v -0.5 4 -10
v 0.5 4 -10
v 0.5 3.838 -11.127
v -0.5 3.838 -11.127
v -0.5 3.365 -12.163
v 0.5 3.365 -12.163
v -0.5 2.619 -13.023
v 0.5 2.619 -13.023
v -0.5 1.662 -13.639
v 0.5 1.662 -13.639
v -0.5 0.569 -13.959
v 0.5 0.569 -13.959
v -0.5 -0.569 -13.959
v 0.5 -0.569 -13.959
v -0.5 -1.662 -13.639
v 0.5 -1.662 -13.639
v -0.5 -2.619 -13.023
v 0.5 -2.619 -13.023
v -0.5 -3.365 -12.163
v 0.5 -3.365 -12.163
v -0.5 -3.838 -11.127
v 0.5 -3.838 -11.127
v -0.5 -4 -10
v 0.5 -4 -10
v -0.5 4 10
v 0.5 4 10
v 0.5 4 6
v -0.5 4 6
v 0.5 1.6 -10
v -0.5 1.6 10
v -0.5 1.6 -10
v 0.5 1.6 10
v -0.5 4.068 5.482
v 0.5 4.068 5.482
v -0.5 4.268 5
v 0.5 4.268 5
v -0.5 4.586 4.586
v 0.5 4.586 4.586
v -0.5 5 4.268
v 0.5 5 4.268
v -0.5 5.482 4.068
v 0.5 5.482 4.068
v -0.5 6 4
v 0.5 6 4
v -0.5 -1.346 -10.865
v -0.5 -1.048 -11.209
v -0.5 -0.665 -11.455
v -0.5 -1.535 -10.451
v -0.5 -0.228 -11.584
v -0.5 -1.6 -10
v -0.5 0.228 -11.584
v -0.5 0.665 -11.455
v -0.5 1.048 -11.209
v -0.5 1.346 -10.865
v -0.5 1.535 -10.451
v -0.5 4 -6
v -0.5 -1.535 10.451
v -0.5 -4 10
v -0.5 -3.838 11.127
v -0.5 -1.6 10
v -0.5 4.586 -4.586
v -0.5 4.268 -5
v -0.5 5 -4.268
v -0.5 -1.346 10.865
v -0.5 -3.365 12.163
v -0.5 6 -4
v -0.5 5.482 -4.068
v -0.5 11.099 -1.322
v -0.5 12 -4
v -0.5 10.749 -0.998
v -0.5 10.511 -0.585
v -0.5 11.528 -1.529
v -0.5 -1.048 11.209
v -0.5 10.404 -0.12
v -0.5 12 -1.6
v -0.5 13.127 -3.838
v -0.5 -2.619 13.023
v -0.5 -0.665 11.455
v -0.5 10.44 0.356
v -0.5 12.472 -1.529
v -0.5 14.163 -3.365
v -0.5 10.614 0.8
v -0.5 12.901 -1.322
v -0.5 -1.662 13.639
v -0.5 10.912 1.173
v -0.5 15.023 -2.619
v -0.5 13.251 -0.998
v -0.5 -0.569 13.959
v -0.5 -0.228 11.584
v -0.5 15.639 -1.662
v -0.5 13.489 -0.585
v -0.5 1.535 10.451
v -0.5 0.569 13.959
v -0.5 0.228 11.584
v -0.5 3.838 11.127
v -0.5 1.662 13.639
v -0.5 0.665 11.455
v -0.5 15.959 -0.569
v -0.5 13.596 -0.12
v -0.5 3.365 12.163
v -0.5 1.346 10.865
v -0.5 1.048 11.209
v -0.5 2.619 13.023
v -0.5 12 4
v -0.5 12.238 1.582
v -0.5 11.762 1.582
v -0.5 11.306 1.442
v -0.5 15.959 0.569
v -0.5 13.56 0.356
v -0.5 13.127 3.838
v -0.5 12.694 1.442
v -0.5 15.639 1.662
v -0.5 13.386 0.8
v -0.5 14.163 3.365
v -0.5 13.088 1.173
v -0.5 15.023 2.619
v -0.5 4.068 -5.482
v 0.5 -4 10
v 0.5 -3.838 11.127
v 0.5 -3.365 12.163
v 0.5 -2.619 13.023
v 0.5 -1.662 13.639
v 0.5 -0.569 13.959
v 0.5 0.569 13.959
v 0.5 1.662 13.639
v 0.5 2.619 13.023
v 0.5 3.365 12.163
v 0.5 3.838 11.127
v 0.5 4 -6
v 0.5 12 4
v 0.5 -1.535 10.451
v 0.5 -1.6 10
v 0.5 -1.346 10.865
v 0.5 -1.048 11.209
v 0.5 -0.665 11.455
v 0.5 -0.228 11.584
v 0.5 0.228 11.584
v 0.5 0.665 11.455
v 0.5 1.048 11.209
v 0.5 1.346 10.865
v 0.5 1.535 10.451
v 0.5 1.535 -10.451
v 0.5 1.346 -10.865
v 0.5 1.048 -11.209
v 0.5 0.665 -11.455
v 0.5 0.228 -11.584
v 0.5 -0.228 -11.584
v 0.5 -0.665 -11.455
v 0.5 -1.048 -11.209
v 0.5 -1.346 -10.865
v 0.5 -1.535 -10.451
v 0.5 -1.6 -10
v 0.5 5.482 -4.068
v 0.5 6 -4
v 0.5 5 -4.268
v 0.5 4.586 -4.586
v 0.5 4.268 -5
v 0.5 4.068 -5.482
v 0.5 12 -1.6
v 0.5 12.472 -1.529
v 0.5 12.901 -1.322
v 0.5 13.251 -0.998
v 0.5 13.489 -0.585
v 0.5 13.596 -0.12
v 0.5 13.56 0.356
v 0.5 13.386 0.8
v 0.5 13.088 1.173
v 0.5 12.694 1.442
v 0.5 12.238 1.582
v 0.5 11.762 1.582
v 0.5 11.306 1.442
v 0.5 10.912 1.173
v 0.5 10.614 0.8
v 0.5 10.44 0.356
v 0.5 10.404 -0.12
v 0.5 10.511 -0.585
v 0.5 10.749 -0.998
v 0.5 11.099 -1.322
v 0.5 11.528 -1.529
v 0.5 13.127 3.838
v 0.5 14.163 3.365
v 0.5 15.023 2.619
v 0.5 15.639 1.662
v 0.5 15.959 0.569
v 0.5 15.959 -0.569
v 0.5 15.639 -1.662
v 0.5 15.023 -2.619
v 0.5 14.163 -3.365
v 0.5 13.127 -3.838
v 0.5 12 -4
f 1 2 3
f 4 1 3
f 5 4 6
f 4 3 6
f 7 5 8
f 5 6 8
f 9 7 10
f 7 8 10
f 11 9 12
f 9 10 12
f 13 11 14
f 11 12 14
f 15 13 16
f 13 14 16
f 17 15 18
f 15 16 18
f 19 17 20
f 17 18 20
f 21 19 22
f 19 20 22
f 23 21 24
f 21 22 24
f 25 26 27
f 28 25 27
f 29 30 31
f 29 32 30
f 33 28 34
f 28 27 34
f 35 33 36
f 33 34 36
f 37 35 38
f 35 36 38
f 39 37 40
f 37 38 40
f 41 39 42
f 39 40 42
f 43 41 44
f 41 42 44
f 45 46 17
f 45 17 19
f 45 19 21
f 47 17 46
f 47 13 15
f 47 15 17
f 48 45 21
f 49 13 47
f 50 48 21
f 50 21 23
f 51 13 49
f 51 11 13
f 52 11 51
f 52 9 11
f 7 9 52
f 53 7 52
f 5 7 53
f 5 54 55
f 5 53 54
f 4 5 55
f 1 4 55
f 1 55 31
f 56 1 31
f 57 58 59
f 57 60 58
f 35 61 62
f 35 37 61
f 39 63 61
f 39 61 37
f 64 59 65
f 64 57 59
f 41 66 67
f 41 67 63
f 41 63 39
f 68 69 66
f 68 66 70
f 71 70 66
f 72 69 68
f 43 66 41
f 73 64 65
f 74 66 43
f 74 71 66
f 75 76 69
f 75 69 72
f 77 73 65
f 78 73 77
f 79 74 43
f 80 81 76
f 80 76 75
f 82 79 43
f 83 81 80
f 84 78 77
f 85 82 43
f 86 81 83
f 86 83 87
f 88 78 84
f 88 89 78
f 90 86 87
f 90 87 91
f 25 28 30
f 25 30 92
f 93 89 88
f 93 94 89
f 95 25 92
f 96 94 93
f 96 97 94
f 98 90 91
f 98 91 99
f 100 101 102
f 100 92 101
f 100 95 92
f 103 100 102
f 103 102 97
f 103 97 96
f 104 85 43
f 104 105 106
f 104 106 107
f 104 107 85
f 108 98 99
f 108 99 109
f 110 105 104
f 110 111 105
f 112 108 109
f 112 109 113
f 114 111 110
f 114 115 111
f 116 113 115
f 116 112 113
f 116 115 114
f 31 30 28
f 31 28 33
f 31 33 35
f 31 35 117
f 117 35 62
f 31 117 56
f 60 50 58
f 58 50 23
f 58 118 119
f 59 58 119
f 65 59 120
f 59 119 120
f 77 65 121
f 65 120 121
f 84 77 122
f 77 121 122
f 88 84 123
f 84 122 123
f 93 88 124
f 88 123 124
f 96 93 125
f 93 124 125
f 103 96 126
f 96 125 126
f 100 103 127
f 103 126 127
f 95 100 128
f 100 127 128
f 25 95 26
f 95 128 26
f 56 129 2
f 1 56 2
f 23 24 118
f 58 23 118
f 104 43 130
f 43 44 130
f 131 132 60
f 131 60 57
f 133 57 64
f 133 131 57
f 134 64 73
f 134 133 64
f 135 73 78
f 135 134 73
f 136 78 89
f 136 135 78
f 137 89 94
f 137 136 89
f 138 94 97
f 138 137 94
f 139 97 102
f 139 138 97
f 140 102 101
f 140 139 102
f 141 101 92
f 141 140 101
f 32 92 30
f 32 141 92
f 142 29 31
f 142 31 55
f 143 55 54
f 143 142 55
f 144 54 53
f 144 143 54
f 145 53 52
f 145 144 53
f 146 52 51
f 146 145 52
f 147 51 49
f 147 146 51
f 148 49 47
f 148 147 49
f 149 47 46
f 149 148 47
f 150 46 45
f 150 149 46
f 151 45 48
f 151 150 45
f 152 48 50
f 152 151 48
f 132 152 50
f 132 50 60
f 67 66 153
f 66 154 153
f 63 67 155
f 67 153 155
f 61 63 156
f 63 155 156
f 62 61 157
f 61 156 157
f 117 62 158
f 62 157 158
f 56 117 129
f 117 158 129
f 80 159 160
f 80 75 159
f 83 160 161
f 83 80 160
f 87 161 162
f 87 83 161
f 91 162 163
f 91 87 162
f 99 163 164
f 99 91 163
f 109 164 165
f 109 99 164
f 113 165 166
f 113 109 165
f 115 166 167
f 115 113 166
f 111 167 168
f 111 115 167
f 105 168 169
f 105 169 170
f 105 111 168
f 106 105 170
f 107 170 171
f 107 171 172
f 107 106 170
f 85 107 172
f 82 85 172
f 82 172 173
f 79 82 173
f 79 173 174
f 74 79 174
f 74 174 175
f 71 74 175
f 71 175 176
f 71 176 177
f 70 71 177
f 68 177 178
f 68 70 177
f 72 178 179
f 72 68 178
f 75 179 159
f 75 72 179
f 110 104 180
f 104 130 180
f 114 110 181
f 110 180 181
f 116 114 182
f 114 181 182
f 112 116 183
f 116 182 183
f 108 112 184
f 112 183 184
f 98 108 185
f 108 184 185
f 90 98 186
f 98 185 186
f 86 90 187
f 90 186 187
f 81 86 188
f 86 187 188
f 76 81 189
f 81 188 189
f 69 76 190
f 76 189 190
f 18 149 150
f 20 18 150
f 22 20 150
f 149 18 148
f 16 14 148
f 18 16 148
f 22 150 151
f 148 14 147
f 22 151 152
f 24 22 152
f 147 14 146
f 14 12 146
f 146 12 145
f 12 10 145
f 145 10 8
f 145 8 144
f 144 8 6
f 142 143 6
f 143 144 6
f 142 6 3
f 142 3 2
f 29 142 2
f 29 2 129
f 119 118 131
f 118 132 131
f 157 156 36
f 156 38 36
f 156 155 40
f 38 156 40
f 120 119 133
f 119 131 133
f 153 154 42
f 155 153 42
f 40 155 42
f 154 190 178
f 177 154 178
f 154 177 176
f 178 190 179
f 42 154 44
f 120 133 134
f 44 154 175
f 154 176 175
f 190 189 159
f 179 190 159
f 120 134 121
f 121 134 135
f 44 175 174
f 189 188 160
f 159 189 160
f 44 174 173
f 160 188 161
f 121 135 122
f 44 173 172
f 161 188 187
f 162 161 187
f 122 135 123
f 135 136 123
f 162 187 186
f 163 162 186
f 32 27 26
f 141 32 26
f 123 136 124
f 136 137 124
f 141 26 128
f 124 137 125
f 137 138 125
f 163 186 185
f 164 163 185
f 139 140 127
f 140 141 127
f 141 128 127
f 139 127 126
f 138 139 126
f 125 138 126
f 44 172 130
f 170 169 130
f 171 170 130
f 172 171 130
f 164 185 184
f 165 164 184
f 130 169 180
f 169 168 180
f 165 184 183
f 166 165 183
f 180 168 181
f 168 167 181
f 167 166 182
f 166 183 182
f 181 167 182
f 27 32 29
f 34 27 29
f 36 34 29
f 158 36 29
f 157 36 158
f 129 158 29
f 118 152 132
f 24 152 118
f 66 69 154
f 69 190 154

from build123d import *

# Parameters (mm, degrees)
SKETCH1_R           = 1.6
BOSS_EXTRUDE1_DEPTH = 0.5


with BuildPart() as part:
    # Sketch1 → Boss-Extrude1 (new body, symmetric)
    with BuildSketch(Plane(origin=(0, 0, 0), x_dir=(0, 0, -1), z_dir=(1, 0, 0))):
        with BuildLine():
            Line((-10, 4), (-6, 4))
            ThreePointArc((-6, 4), (-4.585786438, 4.585786438), (-4, 6))
            Line((-4, 6), (-4, 12))
            ThreePointArc((-4, 12), (0, 16), (4, 12))
            Line((4, 12), (4, 6))
            ThreePointArc((4, 6), (4.585786438, 4.585786438), (6, 4))
            Line((6, 4), (10, 4))
            ThreePointArc((10, 4), (14, 0), (10, -4))
            Line((10, -4), (-10, -4))
            ThreePointArc((-10, -4), (-14, 0), (-10, 4))
        make_face()
        with Locations((0, 12)):
            Circle(SKETCH1_R, mode=Mode.SUBTRACT)
        with BuildLine():
            Line((-10, 1.6), (10, 1.6))
            ThreePointArc((10, 1.6), (11.6, 0), (10, -1.6))
            Line((10, -1.6), (-10, -1.6))
            ThreePointArc((-10, -1.6), (-11.6, 0), (-10, 1.6))
        make_face(mode=Mode.SUBTRACT)
    extrude(amount=BOSS_EXTRUDE1_DEPTH, both=True)


solid = part.part
